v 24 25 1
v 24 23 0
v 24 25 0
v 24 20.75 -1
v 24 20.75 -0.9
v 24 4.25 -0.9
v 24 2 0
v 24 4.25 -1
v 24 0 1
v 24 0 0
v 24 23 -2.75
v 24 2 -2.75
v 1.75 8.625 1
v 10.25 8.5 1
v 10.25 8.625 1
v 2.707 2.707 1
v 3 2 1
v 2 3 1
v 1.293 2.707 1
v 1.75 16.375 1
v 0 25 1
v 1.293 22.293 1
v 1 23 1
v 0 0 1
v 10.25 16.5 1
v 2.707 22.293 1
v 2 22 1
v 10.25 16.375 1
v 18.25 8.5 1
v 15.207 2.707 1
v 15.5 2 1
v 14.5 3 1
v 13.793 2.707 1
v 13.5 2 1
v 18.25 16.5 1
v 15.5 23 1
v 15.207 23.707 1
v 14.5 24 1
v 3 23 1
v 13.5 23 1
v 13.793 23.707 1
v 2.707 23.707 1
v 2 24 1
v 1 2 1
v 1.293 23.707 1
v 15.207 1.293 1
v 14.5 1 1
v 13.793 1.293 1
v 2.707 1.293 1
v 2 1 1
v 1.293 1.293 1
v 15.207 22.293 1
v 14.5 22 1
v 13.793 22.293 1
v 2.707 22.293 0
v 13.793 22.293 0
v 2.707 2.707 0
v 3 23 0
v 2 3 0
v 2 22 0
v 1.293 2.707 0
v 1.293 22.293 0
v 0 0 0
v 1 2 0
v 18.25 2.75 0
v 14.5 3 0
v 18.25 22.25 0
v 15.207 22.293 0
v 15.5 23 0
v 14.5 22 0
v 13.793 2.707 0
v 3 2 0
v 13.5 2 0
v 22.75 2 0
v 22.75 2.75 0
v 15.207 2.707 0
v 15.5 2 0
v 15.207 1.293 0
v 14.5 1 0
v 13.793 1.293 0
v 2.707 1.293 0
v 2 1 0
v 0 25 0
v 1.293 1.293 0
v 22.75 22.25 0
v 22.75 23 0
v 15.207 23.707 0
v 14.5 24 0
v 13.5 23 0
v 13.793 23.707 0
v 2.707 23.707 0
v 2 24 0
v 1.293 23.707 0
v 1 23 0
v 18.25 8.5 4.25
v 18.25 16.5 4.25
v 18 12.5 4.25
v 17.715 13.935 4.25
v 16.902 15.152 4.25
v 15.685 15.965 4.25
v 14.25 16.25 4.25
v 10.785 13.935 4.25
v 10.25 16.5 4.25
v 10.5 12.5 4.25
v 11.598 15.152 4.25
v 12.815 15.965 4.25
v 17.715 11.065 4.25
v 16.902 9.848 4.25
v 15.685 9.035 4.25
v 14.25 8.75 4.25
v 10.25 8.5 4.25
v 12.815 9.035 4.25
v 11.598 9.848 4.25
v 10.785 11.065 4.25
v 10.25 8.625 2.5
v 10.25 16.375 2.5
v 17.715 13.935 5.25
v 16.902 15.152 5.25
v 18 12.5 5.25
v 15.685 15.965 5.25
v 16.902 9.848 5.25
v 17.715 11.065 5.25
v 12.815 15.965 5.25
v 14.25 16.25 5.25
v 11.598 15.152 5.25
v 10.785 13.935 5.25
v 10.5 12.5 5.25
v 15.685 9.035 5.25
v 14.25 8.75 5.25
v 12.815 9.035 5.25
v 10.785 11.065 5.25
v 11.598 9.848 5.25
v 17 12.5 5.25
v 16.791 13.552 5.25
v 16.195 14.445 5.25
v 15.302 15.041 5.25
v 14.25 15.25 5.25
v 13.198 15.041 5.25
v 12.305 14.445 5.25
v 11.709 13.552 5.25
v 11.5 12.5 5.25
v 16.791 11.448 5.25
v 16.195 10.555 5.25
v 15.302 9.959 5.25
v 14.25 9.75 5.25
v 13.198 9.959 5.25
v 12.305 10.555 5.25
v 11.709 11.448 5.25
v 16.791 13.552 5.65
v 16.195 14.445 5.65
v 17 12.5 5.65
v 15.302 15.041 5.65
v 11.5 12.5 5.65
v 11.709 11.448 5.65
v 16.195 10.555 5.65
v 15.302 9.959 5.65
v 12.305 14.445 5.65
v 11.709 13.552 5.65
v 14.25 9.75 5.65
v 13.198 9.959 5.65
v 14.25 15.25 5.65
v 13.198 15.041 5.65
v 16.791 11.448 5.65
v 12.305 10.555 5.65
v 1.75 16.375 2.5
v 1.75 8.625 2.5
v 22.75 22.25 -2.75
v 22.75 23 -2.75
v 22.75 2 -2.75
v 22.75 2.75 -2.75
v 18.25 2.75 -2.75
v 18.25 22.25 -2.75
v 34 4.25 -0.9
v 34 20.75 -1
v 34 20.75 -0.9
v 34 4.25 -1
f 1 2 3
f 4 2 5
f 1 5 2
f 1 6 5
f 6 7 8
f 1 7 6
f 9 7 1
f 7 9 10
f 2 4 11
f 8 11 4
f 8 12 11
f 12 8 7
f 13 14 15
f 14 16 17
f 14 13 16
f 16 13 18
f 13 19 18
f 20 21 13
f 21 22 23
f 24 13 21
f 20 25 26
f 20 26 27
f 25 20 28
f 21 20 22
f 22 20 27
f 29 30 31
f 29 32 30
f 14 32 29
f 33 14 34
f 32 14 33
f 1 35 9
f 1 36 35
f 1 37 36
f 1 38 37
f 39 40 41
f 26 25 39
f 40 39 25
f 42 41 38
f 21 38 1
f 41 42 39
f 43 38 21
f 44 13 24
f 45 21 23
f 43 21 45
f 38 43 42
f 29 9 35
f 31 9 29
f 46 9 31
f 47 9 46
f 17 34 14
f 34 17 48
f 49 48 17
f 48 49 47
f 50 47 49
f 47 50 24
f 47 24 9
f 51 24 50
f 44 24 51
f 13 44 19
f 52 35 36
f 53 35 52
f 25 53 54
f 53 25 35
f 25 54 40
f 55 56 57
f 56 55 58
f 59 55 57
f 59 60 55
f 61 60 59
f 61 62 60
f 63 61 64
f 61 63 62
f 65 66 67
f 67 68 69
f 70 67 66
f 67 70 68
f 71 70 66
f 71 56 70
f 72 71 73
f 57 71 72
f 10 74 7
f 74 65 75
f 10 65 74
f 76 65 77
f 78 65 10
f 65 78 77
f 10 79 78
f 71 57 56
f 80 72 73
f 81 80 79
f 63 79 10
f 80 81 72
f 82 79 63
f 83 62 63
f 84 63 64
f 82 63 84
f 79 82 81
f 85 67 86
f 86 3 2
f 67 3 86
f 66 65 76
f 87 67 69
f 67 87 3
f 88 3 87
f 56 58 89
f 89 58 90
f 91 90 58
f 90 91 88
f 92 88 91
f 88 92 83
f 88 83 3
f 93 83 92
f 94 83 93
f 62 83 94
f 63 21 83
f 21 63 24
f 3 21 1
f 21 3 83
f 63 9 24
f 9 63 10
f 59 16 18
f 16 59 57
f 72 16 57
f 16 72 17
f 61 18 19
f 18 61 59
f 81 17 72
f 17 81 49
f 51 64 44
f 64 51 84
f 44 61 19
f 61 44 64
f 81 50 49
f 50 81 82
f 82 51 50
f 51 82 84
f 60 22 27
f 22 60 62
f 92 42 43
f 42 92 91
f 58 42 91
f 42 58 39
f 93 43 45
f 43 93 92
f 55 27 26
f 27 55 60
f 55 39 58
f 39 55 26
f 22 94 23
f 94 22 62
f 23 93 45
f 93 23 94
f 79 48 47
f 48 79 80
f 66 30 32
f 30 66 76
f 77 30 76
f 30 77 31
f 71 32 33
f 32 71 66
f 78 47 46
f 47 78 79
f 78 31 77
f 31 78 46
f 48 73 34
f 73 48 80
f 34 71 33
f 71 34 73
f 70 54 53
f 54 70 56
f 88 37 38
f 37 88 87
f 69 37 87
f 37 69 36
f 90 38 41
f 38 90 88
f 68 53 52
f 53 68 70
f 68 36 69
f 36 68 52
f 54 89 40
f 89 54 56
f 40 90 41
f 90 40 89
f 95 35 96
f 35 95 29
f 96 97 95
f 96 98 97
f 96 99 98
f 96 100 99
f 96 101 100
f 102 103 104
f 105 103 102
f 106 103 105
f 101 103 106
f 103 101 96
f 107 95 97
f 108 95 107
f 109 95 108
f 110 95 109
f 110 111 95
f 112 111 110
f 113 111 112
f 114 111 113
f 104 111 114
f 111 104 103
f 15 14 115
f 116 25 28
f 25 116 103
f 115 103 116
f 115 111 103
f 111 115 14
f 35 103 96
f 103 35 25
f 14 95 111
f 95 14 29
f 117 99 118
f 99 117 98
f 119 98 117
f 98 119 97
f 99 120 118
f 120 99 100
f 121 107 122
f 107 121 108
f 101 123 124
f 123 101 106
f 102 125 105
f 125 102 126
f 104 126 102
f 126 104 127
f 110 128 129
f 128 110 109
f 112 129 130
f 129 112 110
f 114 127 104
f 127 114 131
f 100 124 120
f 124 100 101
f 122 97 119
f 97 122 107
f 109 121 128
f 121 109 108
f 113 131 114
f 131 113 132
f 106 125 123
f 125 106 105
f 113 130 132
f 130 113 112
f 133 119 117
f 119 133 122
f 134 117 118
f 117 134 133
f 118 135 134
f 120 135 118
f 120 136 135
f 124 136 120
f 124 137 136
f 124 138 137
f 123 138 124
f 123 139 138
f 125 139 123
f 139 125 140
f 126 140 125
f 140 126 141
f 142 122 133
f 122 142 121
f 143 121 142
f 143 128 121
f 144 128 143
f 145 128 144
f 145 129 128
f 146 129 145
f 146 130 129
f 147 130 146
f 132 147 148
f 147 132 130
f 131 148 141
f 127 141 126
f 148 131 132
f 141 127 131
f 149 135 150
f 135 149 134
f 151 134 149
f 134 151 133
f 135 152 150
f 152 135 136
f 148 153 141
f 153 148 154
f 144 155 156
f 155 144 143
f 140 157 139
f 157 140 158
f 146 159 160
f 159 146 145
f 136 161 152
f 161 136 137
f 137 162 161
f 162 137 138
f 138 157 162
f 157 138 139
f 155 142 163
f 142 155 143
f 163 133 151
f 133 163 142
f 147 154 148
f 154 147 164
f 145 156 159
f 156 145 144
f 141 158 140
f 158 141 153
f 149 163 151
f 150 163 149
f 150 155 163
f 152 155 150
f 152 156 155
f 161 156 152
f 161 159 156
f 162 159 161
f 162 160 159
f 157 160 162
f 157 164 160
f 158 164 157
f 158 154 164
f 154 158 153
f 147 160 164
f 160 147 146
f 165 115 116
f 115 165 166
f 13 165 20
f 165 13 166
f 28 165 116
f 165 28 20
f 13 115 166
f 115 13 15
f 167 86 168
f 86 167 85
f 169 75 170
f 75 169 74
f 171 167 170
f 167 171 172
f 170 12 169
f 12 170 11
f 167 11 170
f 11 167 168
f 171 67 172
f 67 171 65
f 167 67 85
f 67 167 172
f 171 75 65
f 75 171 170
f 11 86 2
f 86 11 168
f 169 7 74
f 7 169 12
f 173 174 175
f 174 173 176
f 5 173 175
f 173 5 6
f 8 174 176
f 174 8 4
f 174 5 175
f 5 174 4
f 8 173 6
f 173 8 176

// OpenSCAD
// https://github.com/larsch/openscad-modules/blob/master/rpi-camera.scad
// Raspberry Pi Camera - OpenSCAD
//
// License: CC BY-SA 2.0
// https://creativecommons.org/licenses/by-sa/2.0/legalcode
//
// This case was designed for the Rasperry Pi 1 Model B, because that
// the one i had lying around for this project. I power it via the pin
// header 5V pin using a DC-DC buck converter and an external 9V DC
// power supply. The camera ribbon cable is slighly skewed inside the
// case, because I wanted the case to be small and it doesn't line up
// well.

module rpi_camera() {
     color("darkblue")
	  difference() {
	  #cube([24,25,1]);
	  translate([2,2,-1]) cylinder(d=2,h=3,$fn=8);
	  translate([2,23,-1]) cylinder(d=2,h=3,$fn=8);
	  translate([14.5,2,-1]) cylinder(d=2,h=3,$fn=8);
	  translate([14.5,23,-1]) cylinder(d=2,h=3,$fn=8);
     }
     color("DimGray") union() {
	  translate([10.25,8.5,1]) cube([8,8,3.25]);
	  translate([10.25+4,12.5,1+3.25]) cylinder(d=7.5,h=1,$fn=16);
	  translate([10.25+4,12.5,1+3.25+0.7]) cylinder(d=5.5,h=0.7,$fn=16);
     }
     color("orange") translate([1.75,8.625,1]) cube([8.5,7.75,1.5]);
     color("brown") translate([24-5.75,2.75,-2.75]) cube([4.5,19.5,2.75]);
     color("black") translate([22.75,2,-2.75]) cube([1.25,21,2.75]);
     color("grey") translate([24,4.25,-1]) cube([10,16.5,0.1]);
}
rpi_camera();
